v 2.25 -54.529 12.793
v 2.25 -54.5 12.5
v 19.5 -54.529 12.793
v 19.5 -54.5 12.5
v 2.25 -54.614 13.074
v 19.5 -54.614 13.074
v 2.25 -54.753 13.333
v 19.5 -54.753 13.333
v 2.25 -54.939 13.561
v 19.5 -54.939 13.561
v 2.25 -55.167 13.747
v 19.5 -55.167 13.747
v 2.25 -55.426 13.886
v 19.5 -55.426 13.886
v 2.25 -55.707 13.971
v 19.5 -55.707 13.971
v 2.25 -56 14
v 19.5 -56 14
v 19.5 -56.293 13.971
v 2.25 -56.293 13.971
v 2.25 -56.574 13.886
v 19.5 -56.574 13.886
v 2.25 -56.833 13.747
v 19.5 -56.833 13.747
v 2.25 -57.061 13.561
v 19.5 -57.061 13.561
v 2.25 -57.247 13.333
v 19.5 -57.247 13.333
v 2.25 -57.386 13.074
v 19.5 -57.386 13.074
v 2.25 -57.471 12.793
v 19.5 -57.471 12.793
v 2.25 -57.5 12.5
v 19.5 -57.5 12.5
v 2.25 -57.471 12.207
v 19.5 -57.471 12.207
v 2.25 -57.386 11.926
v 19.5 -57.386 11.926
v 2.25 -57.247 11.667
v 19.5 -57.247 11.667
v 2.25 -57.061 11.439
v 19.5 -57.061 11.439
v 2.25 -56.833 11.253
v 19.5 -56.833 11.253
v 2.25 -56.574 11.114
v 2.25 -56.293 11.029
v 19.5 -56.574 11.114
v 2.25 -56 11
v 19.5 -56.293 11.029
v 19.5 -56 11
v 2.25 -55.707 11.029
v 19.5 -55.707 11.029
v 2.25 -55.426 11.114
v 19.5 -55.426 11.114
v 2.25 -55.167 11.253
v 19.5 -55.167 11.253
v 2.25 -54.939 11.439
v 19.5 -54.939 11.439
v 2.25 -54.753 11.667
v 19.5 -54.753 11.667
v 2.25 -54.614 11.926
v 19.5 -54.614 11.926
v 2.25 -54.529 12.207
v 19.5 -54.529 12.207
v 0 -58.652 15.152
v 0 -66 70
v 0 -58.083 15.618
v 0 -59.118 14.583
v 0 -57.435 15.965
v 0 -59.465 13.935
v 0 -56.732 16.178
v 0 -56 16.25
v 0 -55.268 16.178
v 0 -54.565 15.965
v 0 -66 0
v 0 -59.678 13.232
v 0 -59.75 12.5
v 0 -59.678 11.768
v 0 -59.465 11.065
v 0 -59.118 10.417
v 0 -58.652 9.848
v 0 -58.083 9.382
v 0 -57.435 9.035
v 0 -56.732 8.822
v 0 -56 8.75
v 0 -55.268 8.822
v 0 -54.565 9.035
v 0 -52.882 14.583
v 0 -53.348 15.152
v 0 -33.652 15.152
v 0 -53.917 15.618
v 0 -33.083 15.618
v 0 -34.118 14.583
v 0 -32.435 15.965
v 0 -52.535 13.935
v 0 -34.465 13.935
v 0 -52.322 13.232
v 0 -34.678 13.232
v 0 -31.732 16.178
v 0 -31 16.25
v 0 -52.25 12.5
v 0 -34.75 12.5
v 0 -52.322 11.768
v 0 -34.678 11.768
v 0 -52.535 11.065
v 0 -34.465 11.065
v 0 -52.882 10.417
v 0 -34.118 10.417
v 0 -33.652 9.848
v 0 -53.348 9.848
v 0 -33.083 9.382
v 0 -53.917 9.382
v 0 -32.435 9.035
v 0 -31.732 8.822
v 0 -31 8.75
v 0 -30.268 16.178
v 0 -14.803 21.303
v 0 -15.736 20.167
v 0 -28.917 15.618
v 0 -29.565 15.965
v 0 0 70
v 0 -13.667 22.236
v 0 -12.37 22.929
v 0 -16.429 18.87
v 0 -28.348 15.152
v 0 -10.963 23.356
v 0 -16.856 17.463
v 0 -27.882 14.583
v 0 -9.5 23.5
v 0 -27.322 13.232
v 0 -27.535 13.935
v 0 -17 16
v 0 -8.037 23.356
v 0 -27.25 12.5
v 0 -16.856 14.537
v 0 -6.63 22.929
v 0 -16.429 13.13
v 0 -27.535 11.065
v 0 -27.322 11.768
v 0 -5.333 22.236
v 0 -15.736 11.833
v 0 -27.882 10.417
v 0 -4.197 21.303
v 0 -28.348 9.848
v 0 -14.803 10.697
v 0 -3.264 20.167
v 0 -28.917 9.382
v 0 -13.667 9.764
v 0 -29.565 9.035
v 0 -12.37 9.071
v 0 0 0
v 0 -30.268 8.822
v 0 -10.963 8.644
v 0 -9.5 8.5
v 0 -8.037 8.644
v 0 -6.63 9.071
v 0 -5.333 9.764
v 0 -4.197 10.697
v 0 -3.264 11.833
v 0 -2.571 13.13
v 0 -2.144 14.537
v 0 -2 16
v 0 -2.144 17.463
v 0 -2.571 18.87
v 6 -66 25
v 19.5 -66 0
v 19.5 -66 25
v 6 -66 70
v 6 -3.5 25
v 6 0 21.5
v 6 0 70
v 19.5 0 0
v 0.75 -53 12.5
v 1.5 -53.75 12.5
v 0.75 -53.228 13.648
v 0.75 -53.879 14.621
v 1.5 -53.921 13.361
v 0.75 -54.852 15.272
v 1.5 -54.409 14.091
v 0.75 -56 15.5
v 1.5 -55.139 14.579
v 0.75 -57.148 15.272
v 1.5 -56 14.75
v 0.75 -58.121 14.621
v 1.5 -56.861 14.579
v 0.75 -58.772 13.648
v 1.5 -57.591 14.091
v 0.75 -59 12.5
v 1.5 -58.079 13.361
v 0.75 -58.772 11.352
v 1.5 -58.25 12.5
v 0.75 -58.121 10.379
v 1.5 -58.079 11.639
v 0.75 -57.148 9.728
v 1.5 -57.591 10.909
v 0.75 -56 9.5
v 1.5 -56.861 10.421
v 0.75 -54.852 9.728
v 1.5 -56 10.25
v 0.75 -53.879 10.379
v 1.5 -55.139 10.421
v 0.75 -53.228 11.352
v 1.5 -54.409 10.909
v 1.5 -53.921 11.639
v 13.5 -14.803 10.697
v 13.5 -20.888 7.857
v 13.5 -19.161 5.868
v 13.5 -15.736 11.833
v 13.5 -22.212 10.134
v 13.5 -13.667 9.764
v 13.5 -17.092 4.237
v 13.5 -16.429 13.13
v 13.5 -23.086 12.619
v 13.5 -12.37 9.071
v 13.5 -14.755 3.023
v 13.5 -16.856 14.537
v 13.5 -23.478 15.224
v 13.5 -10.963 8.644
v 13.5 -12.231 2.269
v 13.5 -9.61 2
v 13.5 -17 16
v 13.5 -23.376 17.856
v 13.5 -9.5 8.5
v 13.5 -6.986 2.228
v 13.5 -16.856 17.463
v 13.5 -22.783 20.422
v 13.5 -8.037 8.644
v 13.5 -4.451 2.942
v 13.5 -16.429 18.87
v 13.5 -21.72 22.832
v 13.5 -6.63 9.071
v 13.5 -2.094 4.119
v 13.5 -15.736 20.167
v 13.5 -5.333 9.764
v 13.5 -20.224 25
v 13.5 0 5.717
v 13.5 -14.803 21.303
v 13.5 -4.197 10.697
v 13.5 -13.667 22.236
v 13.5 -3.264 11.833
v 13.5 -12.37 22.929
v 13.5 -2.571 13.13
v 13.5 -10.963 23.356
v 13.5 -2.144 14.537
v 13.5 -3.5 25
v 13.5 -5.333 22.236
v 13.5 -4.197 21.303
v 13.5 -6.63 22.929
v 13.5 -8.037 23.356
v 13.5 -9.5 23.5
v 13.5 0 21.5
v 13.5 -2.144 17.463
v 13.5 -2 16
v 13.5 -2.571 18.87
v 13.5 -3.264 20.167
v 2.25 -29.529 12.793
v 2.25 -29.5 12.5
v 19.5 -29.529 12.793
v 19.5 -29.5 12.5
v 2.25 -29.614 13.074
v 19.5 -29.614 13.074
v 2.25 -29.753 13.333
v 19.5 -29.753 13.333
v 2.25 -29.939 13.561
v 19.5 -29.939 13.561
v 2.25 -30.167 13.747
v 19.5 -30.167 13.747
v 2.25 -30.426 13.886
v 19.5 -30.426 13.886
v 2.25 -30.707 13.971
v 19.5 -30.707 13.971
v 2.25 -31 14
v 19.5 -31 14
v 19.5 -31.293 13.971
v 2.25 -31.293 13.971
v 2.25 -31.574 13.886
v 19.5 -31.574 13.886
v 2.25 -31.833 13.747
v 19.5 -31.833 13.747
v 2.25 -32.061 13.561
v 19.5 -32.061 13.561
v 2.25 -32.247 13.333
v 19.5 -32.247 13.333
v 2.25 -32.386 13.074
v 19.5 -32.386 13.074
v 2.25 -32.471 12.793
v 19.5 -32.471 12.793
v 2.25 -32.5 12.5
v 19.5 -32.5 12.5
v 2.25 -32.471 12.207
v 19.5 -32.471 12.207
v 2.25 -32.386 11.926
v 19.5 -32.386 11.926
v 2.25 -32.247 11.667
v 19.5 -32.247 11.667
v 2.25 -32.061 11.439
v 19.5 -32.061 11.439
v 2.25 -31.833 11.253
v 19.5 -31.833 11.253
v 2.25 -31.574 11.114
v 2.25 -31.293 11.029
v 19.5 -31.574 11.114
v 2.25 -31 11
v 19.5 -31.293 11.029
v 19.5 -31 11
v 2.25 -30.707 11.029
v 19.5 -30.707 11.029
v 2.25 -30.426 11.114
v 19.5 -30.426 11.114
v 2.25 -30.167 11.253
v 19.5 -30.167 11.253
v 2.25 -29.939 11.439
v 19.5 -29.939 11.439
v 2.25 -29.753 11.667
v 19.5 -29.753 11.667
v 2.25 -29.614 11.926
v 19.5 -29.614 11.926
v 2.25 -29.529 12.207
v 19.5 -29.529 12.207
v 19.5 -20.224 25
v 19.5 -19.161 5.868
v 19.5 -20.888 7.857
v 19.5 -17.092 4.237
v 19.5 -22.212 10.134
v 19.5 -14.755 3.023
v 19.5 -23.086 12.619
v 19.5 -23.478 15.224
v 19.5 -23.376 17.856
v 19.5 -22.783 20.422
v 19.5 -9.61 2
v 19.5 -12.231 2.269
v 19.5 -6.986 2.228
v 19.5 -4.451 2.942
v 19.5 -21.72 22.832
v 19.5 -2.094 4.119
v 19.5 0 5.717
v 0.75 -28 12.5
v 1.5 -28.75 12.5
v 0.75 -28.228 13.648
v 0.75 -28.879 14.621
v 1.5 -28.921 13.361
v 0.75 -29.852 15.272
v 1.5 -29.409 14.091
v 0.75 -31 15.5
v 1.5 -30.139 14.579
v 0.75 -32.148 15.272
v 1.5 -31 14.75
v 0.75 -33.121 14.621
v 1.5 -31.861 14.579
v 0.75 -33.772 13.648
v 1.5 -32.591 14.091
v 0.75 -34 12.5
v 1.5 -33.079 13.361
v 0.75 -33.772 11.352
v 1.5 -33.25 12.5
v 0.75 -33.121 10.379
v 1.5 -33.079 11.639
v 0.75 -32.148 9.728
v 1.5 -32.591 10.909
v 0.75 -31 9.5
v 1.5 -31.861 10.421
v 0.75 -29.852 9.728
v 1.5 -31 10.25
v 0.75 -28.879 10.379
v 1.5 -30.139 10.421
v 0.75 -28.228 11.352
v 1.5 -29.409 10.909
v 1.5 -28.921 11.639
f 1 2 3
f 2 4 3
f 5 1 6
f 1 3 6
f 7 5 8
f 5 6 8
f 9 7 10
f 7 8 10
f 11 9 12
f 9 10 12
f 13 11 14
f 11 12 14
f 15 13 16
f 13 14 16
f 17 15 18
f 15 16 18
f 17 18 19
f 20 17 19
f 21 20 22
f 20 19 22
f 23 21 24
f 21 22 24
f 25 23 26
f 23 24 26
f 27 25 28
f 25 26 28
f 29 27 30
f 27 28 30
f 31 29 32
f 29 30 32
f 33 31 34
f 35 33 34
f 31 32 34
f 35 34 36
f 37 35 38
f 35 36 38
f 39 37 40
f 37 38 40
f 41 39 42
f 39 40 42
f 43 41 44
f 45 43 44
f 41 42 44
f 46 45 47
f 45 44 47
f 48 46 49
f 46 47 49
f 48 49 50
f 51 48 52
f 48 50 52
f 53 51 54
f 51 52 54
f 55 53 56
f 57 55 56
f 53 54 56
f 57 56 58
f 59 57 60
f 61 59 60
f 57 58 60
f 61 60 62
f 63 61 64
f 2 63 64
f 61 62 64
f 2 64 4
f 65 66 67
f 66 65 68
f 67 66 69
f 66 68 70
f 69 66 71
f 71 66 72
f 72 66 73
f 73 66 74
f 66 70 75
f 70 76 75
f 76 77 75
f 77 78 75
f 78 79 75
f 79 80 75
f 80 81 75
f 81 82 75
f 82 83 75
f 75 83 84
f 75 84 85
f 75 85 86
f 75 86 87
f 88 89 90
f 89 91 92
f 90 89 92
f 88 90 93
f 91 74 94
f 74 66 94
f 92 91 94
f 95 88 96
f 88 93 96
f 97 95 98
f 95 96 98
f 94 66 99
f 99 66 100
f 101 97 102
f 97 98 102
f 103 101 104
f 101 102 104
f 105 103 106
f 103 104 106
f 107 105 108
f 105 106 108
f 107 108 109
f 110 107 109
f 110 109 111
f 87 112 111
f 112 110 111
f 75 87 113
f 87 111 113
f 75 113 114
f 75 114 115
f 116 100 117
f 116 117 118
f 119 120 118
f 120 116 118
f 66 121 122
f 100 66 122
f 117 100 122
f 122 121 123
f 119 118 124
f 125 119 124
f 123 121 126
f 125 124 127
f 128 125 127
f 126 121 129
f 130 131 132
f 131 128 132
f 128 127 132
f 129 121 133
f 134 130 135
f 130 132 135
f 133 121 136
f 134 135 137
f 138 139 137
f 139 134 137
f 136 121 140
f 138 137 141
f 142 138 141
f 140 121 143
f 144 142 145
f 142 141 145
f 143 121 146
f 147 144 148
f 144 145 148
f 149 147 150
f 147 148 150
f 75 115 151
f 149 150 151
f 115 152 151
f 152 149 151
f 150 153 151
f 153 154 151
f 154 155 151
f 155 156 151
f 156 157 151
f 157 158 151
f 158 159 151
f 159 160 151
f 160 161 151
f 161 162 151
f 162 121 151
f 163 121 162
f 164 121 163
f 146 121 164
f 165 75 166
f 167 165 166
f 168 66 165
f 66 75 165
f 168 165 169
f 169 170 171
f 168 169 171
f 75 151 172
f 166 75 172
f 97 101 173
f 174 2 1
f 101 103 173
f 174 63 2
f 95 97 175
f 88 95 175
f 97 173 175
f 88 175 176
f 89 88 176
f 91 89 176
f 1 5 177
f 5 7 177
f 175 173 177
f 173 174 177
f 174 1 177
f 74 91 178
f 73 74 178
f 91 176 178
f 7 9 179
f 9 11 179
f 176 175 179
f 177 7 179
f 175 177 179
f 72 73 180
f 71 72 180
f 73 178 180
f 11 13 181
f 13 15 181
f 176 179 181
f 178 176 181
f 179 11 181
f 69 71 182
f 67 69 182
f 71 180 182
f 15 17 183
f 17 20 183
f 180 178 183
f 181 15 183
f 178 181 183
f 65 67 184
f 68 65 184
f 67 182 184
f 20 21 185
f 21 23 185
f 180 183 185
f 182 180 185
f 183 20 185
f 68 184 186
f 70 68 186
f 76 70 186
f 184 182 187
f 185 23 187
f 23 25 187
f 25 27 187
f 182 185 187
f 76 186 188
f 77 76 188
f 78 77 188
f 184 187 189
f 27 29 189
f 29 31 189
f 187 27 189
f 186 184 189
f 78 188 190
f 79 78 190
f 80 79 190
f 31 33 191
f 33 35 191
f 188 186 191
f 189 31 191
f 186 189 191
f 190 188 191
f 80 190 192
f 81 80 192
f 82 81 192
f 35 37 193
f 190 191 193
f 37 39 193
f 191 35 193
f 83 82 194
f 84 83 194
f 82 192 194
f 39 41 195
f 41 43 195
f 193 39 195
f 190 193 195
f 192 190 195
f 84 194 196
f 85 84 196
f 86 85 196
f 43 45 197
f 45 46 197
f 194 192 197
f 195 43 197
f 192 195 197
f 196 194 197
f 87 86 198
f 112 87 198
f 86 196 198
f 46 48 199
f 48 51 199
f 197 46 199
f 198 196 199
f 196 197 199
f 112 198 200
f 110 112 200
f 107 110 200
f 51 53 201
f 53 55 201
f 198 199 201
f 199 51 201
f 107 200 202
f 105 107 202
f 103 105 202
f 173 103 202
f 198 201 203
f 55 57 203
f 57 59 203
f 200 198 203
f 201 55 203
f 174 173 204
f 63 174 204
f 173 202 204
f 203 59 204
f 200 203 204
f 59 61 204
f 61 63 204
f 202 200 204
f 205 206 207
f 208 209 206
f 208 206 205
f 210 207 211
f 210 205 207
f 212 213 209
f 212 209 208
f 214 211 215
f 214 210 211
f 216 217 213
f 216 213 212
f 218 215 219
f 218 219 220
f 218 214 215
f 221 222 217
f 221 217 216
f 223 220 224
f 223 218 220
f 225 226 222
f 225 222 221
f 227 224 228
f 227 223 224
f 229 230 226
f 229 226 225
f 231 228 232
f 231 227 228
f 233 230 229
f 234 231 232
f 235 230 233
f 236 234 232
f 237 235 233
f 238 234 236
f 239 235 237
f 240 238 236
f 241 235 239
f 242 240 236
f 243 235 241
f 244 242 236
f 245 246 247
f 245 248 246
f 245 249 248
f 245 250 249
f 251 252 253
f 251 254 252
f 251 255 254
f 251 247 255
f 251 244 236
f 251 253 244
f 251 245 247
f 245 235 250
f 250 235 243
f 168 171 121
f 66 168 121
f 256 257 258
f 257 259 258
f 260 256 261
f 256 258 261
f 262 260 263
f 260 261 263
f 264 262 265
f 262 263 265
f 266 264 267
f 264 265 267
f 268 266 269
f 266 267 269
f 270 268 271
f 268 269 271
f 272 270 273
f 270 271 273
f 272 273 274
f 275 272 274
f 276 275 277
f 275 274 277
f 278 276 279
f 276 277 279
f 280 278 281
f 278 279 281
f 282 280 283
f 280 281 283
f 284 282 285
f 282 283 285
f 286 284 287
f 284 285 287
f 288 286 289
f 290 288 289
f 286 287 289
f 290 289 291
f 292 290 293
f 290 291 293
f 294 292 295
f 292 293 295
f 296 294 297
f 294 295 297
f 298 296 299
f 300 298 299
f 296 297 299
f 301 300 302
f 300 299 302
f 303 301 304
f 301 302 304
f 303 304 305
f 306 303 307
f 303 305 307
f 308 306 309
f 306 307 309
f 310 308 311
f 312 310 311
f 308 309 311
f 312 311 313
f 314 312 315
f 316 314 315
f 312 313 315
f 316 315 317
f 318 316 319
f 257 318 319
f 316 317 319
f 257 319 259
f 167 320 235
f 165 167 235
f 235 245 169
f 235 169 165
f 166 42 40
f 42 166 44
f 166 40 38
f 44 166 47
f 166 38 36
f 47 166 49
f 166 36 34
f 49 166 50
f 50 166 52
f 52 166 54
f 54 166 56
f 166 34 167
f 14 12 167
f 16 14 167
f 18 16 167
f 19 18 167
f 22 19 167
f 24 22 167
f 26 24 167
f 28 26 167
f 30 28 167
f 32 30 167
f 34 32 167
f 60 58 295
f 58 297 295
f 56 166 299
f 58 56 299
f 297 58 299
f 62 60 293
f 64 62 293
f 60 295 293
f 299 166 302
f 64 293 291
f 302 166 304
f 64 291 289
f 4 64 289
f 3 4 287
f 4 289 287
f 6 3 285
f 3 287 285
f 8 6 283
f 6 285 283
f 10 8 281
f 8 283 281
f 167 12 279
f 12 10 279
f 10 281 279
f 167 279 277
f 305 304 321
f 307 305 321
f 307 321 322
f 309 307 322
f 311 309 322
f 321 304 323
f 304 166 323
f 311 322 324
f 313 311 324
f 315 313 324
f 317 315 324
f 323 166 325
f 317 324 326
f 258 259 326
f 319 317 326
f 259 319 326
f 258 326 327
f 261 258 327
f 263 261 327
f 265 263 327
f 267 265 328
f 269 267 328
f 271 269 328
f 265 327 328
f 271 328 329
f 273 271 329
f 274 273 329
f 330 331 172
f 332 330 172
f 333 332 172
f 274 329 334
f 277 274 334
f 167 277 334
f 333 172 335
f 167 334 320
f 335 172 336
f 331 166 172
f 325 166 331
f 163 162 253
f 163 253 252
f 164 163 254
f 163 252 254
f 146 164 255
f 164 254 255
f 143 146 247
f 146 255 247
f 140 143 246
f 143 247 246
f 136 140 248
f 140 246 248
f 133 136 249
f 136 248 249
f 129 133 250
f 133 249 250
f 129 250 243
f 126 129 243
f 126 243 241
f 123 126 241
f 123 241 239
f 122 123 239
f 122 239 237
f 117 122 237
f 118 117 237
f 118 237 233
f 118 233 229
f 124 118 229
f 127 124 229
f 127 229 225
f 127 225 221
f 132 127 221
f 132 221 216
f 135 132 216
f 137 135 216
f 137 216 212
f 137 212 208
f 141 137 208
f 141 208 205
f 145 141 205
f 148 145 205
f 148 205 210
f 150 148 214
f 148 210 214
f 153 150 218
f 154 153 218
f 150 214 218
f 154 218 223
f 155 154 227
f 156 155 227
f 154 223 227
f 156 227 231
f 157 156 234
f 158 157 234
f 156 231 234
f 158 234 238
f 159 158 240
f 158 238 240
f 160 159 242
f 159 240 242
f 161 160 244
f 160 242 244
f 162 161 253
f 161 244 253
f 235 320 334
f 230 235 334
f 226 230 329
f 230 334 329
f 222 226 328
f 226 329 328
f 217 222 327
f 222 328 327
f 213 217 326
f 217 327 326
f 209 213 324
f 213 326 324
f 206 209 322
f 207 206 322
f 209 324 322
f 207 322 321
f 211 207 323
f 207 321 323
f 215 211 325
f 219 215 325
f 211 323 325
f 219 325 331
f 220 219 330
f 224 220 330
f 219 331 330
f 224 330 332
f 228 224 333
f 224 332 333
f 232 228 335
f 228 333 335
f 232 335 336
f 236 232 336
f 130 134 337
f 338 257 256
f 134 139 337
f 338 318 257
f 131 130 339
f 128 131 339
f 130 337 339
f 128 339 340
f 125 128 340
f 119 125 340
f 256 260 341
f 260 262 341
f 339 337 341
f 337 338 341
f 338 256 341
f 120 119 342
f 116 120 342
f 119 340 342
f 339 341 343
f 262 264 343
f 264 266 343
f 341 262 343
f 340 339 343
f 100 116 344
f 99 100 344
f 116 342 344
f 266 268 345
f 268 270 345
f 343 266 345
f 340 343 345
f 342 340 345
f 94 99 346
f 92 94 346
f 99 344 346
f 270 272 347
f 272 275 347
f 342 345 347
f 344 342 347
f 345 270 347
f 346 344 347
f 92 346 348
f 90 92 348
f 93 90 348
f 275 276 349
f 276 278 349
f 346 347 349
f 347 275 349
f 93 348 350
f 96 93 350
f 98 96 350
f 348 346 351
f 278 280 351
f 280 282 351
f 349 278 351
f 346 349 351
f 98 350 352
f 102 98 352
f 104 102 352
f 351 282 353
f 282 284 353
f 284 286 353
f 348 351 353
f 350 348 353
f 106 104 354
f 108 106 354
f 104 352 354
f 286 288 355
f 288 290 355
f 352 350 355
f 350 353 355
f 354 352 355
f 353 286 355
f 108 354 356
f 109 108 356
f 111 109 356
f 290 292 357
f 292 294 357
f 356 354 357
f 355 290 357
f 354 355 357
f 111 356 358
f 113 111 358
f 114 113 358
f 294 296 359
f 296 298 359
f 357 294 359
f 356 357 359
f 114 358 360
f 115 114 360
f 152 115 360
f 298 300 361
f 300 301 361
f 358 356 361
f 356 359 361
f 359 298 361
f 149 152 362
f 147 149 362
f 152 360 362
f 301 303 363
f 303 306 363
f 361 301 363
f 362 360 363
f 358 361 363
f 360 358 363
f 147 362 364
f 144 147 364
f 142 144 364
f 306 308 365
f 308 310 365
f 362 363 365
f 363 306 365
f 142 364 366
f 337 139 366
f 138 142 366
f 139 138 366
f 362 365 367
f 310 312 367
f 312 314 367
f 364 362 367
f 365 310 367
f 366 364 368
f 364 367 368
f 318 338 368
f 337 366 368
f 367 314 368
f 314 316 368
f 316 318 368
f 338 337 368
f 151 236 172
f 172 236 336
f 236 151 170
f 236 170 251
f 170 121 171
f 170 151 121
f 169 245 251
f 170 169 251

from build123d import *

# Parameters (mm, degrees)
F1_DEPTH        = 66
F2_R            = 7.5
F3_DEPTH        = 19.501
F5_DEPTH        = 6
F7_DEPTH        = 13.5
F8_R            = 1.5
F9_DEPTH        = 6.001
F11_D           = 3
F11_CSINK_D     = 7.5
F11_CSINK_ANGLE = 90


with BuildPart() as f1:
    # F0 (on Front) → F1 (new body)
    with BuildSketch(Plane.XZ):
        Polygon((0, 70), (0, 0), (19.5, 0), (19.5, 25), (6, 25), (6, 70), align=None)
    extrude(amount=F1_DEPTH)

    # F2 (on face) → F3 (cut, through all)
    with BuildSketch(Plane.YZ.offset(19.5)):
        with Locations((-9.5, 16)):
            Circle(F2_R)
    extrude(amount=-F3_DEPTH, mode=Mode.SUBTRACT)

    # F4 (on face) → F5 (cut)
    with BuildSketch(Plane.YZ.offset(19.5)):
        with BuildLine():
            Line((0, 25), (-20.223805, 25))
            ThreePointArc((-20.223805, 25), (-19.161138, 5.867754), (0, 5.716518))
            Line((0, 5.716518), (0, 25))
        make_face()
    extrude(amount=-F5_DEPTH, mode=Mode.SUBTRACT)

    # F6 (on face) → F7 (cut)
    with BuildSketch(Plane.YZ.offset(19.5)):
        Polygon((-3.5, 25), (0, 21.5), (0, 25), align=None)
    extrude(amount=-F7_DEPTH, mode=Mode.SUBTRACT)

    # F8 (on face) → F9 (cut, through all)
    with BuildSketch(Plane.YZ.offset(6)):
        with Locations((-17.5, 82.5)):
            Circle(F8_R)
        with Locations((-48.5, 82.5)):
            Circle(F8_R)
    extrude(amount=-F9_DEPTH, mode=Mode.SUBTRACT)

    # F11 (through all)
    with Locations(Plane(origin=(0, 0, 0), x_dir=(0, -1, 0), z_dir=(-1, 0, 0))):
        with Locations((31, 12.5), (56, 12.5), (56, 12.5)):
            CounterSinkHole(F11_D / 2, F11_CSINK_D / 2, counter_sink_angle=F11_CSINK_ANGLE)


solid = f1.part
